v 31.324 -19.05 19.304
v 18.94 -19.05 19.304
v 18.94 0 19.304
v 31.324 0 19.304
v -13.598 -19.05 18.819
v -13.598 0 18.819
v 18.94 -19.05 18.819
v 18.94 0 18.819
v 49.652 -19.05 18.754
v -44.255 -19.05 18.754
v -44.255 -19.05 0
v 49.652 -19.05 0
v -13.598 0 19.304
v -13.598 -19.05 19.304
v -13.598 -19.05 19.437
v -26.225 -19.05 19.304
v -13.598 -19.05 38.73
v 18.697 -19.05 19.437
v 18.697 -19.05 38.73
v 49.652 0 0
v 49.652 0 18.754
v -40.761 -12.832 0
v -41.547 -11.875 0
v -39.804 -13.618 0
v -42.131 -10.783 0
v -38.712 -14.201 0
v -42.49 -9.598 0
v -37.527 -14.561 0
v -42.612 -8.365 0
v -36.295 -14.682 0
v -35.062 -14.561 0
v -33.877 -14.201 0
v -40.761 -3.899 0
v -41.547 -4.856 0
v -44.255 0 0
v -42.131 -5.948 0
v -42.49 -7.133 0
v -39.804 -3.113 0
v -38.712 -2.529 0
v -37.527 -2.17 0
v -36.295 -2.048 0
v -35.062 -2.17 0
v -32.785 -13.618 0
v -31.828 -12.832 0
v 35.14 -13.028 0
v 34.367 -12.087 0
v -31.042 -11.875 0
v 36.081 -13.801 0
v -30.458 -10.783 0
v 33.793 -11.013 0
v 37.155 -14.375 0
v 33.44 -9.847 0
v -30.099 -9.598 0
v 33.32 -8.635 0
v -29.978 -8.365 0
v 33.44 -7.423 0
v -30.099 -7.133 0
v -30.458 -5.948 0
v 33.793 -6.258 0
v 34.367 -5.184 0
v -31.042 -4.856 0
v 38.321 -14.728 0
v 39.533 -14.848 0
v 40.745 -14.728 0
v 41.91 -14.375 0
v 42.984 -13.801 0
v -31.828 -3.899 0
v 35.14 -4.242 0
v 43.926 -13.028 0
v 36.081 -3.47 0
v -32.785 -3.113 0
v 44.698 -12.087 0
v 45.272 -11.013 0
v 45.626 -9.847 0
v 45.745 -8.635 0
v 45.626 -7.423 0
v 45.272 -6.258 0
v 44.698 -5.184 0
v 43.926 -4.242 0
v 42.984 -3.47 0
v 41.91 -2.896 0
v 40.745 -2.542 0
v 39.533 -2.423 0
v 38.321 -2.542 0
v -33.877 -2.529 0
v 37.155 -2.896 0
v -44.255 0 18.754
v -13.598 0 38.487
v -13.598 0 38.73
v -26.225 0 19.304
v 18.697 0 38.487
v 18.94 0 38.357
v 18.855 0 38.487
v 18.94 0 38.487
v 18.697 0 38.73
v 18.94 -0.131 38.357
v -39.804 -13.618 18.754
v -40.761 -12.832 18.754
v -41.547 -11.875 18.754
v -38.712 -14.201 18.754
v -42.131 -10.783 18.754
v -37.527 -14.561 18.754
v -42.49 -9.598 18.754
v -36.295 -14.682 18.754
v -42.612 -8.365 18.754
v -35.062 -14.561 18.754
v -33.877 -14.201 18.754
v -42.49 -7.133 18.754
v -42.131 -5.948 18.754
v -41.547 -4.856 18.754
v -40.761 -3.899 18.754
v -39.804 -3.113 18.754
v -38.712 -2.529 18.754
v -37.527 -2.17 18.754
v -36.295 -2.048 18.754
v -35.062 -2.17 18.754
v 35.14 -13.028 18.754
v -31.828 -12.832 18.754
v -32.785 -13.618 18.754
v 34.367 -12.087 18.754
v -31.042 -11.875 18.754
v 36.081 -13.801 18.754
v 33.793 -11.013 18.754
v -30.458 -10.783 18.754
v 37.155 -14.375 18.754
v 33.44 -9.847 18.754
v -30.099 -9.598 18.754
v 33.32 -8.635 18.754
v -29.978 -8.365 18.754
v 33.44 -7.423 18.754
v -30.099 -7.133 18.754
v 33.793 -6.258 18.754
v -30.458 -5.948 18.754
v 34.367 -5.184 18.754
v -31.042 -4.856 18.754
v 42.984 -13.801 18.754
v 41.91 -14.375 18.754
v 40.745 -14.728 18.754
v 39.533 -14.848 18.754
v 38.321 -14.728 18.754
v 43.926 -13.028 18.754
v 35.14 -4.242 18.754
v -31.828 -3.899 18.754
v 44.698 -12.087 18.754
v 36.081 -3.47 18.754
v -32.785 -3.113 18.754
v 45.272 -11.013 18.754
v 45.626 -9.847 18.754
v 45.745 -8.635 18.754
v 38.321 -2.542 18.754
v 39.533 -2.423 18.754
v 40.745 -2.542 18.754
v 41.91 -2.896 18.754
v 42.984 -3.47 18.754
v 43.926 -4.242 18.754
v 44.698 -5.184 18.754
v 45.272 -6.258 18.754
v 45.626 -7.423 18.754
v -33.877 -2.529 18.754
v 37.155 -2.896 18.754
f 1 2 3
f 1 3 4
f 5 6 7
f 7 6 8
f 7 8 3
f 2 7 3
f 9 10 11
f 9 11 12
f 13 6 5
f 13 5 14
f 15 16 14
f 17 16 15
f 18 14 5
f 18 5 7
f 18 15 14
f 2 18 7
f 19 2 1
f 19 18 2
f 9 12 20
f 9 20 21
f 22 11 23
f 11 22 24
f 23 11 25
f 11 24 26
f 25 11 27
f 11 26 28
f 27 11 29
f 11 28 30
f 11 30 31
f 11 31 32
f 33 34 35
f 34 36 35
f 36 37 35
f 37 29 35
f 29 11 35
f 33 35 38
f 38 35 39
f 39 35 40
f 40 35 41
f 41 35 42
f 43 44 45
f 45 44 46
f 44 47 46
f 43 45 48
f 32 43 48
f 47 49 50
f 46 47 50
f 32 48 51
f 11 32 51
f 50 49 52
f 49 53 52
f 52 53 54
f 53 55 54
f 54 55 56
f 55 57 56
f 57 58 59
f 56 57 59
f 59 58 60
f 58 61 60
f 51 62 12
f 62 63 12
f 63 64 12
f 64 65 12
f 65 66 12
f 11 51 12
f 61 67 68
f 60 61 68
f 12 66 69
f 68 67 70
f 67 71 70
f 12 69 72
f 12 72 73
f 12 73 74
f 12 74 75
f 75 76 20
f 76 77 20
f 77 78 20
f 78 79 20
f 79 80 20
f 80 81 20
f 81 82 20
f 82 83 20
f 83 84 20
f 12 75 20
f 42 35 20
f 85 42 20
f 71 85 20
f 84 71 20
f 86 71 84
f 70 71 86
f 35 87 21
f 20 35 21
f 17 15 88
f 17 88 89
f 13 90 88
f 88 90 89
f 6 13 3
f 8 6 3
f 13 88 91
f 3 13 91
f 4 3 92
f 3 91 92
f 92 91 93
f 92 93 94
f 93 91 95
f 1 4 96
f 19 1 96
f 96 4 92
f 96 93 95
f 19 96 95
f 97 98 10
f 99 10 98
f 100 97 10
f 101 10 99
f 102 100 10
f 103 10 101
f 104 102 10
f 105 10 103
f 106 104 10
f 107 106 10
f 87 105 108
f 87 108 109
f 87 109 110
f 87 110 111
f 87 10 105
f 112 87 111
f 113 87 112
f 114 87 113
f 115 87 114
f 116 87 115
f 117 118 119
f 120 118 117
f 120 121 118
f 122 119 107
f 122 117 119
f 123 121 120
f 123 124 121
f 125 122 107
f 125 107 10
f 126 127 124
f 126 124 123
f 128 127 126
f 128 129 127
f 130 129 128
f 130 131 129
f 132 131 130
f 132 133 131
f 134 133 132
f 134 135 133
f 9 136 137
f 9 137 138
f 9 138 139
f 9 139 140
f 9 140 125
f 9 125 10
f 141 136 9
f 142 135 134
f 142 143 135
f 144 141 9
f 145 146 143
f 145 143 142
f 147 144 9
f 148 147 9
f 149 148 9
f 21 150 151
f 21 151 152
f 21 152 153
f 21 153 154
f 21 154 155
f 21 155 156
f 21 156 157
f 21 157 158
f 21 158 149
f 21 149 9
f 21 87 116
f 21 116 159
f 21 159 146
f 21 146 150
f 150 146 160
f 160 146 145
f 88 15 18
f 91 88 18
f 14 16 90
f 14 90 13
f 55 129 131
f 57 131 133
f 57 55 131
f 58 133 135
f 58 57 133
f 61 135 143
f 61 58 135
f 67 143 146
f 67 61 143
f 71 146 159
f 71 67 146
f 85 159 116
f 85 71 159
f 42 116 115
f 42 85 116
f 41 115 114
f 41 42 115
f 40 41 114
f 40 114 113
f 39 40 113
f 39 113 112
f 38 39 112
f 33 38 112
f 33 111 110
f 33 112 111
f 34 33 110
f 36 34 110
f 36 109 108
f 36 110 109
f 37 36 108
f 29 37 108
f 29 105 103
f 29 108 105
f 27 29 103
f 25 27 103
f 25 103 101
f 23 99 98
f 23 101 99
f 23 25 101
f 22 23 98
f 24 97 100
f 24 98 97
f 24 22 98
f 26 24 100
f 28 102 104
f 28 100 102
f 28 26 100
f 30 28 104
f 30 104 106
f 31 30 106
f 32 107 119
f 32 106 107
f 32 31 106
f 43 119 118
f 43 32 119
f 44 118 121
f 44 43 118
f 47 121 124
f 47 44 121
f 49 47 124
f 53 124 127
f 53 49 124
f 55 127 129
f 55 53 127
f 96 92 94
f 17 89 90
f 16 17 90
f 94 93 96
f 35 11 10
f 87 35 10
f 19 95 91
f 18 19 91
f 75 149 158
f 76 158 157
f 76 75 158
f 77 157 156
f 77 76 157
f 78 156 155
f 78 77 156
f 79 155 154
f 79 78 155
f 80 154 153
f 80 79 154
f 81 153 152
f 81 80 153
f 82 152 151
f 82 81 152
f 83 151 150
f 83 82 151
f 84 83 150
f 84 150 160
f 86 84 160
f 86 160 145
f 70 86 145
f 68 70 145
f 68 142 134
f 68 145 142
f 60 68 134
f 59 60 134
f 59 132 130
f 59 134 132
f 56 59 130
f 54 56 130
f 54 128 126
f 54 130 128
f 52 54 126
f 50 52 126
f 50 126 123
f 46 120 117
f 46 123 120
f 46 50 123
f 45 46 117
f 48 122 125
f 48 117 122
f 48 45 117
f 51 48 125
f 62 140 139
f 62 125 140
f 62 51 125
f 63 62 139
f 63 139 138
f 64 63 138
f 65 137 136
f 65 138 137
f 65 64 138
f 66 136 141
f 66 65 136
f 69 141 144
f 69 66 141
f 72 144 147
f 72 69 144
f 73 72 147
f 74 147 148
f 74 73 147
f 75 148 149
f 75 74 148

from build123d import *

# Parameters (mm, degrees)
F0_W     = 93.9071848989
F0_H     = 18.754452467
F1_DEPTH = 19.05
F2_R     = 6.2123744746
F2_R_2   = 6.3169870481
F3_DEPTH = 25.4
F4_W     = 32.5382091105
F4_H     = 19.6686182171
F5_DEPTH = 19.05
F6_SIZE  = 19.04999
F8_DEPTH = 19.05


# Not quite as in the source:
# - a fillet or chamfer is up to 0.001 mm smaller than in the source, because OpenCascade refuses the exact size


with BuildPart() as f1:
    # F0 (on Front) → F1 (new body)
    with BuildSketch(Plane.XZ):
        with Locations((2.6984810829, 9.3772262335)):
            Rectangle(F0_W, F0_H)
    extrude(amount=F1_DEPTH)

    # F2 (on Top) → F3 (cut)
    with BuildSketch(Plane.XY):
        with Locations((39.5327657461, -8.6351428181)):
            Circle(F2_R)
        with Locations((-36.2945869565, -8.3652948961)):
            Circle(F2_R_2)
    extrude(amount=F3_DEPTH, mode=Mode.SUBTRACT)


with BuildPart() as f5:
    # F4 (on Front) → F5 (new body)
    with BuildSketch(Plane.XZ):
        with Locations((2.6710461825, 28.6530507728)):
            Rectangle(F4_W, F4_H)
    extrude(amount=F5_DEPTH)

    # F6 (size 19.05 in the source; OpenCascade refuses exactly that, so slightly less here)
    f6_edges = [f5.edges().sort_by_distance(p)[0] for p in [
        (2.671046, -19.05, 38.48736),
    ]]
    chamfer(f6_edges, length=F6_SIZE)

    # F7 (on Front) → F8 (join)
    with BuildSketch(Plane.XZ):
        Polygon((31.3240997493, 19.3043854088), (18.6973288655, 38.7301817536), (18.6973288655, 19.3043854088), align=None)
        Polygon((-13.5980583727, 19.3043854088), (-13.5980583727, 38.7301817536), (-26.2248255312, 19.3043854088), align=None)
    extrude(amount=F8_DEPTH)


solid = Compound([f1.part, f5.part])
